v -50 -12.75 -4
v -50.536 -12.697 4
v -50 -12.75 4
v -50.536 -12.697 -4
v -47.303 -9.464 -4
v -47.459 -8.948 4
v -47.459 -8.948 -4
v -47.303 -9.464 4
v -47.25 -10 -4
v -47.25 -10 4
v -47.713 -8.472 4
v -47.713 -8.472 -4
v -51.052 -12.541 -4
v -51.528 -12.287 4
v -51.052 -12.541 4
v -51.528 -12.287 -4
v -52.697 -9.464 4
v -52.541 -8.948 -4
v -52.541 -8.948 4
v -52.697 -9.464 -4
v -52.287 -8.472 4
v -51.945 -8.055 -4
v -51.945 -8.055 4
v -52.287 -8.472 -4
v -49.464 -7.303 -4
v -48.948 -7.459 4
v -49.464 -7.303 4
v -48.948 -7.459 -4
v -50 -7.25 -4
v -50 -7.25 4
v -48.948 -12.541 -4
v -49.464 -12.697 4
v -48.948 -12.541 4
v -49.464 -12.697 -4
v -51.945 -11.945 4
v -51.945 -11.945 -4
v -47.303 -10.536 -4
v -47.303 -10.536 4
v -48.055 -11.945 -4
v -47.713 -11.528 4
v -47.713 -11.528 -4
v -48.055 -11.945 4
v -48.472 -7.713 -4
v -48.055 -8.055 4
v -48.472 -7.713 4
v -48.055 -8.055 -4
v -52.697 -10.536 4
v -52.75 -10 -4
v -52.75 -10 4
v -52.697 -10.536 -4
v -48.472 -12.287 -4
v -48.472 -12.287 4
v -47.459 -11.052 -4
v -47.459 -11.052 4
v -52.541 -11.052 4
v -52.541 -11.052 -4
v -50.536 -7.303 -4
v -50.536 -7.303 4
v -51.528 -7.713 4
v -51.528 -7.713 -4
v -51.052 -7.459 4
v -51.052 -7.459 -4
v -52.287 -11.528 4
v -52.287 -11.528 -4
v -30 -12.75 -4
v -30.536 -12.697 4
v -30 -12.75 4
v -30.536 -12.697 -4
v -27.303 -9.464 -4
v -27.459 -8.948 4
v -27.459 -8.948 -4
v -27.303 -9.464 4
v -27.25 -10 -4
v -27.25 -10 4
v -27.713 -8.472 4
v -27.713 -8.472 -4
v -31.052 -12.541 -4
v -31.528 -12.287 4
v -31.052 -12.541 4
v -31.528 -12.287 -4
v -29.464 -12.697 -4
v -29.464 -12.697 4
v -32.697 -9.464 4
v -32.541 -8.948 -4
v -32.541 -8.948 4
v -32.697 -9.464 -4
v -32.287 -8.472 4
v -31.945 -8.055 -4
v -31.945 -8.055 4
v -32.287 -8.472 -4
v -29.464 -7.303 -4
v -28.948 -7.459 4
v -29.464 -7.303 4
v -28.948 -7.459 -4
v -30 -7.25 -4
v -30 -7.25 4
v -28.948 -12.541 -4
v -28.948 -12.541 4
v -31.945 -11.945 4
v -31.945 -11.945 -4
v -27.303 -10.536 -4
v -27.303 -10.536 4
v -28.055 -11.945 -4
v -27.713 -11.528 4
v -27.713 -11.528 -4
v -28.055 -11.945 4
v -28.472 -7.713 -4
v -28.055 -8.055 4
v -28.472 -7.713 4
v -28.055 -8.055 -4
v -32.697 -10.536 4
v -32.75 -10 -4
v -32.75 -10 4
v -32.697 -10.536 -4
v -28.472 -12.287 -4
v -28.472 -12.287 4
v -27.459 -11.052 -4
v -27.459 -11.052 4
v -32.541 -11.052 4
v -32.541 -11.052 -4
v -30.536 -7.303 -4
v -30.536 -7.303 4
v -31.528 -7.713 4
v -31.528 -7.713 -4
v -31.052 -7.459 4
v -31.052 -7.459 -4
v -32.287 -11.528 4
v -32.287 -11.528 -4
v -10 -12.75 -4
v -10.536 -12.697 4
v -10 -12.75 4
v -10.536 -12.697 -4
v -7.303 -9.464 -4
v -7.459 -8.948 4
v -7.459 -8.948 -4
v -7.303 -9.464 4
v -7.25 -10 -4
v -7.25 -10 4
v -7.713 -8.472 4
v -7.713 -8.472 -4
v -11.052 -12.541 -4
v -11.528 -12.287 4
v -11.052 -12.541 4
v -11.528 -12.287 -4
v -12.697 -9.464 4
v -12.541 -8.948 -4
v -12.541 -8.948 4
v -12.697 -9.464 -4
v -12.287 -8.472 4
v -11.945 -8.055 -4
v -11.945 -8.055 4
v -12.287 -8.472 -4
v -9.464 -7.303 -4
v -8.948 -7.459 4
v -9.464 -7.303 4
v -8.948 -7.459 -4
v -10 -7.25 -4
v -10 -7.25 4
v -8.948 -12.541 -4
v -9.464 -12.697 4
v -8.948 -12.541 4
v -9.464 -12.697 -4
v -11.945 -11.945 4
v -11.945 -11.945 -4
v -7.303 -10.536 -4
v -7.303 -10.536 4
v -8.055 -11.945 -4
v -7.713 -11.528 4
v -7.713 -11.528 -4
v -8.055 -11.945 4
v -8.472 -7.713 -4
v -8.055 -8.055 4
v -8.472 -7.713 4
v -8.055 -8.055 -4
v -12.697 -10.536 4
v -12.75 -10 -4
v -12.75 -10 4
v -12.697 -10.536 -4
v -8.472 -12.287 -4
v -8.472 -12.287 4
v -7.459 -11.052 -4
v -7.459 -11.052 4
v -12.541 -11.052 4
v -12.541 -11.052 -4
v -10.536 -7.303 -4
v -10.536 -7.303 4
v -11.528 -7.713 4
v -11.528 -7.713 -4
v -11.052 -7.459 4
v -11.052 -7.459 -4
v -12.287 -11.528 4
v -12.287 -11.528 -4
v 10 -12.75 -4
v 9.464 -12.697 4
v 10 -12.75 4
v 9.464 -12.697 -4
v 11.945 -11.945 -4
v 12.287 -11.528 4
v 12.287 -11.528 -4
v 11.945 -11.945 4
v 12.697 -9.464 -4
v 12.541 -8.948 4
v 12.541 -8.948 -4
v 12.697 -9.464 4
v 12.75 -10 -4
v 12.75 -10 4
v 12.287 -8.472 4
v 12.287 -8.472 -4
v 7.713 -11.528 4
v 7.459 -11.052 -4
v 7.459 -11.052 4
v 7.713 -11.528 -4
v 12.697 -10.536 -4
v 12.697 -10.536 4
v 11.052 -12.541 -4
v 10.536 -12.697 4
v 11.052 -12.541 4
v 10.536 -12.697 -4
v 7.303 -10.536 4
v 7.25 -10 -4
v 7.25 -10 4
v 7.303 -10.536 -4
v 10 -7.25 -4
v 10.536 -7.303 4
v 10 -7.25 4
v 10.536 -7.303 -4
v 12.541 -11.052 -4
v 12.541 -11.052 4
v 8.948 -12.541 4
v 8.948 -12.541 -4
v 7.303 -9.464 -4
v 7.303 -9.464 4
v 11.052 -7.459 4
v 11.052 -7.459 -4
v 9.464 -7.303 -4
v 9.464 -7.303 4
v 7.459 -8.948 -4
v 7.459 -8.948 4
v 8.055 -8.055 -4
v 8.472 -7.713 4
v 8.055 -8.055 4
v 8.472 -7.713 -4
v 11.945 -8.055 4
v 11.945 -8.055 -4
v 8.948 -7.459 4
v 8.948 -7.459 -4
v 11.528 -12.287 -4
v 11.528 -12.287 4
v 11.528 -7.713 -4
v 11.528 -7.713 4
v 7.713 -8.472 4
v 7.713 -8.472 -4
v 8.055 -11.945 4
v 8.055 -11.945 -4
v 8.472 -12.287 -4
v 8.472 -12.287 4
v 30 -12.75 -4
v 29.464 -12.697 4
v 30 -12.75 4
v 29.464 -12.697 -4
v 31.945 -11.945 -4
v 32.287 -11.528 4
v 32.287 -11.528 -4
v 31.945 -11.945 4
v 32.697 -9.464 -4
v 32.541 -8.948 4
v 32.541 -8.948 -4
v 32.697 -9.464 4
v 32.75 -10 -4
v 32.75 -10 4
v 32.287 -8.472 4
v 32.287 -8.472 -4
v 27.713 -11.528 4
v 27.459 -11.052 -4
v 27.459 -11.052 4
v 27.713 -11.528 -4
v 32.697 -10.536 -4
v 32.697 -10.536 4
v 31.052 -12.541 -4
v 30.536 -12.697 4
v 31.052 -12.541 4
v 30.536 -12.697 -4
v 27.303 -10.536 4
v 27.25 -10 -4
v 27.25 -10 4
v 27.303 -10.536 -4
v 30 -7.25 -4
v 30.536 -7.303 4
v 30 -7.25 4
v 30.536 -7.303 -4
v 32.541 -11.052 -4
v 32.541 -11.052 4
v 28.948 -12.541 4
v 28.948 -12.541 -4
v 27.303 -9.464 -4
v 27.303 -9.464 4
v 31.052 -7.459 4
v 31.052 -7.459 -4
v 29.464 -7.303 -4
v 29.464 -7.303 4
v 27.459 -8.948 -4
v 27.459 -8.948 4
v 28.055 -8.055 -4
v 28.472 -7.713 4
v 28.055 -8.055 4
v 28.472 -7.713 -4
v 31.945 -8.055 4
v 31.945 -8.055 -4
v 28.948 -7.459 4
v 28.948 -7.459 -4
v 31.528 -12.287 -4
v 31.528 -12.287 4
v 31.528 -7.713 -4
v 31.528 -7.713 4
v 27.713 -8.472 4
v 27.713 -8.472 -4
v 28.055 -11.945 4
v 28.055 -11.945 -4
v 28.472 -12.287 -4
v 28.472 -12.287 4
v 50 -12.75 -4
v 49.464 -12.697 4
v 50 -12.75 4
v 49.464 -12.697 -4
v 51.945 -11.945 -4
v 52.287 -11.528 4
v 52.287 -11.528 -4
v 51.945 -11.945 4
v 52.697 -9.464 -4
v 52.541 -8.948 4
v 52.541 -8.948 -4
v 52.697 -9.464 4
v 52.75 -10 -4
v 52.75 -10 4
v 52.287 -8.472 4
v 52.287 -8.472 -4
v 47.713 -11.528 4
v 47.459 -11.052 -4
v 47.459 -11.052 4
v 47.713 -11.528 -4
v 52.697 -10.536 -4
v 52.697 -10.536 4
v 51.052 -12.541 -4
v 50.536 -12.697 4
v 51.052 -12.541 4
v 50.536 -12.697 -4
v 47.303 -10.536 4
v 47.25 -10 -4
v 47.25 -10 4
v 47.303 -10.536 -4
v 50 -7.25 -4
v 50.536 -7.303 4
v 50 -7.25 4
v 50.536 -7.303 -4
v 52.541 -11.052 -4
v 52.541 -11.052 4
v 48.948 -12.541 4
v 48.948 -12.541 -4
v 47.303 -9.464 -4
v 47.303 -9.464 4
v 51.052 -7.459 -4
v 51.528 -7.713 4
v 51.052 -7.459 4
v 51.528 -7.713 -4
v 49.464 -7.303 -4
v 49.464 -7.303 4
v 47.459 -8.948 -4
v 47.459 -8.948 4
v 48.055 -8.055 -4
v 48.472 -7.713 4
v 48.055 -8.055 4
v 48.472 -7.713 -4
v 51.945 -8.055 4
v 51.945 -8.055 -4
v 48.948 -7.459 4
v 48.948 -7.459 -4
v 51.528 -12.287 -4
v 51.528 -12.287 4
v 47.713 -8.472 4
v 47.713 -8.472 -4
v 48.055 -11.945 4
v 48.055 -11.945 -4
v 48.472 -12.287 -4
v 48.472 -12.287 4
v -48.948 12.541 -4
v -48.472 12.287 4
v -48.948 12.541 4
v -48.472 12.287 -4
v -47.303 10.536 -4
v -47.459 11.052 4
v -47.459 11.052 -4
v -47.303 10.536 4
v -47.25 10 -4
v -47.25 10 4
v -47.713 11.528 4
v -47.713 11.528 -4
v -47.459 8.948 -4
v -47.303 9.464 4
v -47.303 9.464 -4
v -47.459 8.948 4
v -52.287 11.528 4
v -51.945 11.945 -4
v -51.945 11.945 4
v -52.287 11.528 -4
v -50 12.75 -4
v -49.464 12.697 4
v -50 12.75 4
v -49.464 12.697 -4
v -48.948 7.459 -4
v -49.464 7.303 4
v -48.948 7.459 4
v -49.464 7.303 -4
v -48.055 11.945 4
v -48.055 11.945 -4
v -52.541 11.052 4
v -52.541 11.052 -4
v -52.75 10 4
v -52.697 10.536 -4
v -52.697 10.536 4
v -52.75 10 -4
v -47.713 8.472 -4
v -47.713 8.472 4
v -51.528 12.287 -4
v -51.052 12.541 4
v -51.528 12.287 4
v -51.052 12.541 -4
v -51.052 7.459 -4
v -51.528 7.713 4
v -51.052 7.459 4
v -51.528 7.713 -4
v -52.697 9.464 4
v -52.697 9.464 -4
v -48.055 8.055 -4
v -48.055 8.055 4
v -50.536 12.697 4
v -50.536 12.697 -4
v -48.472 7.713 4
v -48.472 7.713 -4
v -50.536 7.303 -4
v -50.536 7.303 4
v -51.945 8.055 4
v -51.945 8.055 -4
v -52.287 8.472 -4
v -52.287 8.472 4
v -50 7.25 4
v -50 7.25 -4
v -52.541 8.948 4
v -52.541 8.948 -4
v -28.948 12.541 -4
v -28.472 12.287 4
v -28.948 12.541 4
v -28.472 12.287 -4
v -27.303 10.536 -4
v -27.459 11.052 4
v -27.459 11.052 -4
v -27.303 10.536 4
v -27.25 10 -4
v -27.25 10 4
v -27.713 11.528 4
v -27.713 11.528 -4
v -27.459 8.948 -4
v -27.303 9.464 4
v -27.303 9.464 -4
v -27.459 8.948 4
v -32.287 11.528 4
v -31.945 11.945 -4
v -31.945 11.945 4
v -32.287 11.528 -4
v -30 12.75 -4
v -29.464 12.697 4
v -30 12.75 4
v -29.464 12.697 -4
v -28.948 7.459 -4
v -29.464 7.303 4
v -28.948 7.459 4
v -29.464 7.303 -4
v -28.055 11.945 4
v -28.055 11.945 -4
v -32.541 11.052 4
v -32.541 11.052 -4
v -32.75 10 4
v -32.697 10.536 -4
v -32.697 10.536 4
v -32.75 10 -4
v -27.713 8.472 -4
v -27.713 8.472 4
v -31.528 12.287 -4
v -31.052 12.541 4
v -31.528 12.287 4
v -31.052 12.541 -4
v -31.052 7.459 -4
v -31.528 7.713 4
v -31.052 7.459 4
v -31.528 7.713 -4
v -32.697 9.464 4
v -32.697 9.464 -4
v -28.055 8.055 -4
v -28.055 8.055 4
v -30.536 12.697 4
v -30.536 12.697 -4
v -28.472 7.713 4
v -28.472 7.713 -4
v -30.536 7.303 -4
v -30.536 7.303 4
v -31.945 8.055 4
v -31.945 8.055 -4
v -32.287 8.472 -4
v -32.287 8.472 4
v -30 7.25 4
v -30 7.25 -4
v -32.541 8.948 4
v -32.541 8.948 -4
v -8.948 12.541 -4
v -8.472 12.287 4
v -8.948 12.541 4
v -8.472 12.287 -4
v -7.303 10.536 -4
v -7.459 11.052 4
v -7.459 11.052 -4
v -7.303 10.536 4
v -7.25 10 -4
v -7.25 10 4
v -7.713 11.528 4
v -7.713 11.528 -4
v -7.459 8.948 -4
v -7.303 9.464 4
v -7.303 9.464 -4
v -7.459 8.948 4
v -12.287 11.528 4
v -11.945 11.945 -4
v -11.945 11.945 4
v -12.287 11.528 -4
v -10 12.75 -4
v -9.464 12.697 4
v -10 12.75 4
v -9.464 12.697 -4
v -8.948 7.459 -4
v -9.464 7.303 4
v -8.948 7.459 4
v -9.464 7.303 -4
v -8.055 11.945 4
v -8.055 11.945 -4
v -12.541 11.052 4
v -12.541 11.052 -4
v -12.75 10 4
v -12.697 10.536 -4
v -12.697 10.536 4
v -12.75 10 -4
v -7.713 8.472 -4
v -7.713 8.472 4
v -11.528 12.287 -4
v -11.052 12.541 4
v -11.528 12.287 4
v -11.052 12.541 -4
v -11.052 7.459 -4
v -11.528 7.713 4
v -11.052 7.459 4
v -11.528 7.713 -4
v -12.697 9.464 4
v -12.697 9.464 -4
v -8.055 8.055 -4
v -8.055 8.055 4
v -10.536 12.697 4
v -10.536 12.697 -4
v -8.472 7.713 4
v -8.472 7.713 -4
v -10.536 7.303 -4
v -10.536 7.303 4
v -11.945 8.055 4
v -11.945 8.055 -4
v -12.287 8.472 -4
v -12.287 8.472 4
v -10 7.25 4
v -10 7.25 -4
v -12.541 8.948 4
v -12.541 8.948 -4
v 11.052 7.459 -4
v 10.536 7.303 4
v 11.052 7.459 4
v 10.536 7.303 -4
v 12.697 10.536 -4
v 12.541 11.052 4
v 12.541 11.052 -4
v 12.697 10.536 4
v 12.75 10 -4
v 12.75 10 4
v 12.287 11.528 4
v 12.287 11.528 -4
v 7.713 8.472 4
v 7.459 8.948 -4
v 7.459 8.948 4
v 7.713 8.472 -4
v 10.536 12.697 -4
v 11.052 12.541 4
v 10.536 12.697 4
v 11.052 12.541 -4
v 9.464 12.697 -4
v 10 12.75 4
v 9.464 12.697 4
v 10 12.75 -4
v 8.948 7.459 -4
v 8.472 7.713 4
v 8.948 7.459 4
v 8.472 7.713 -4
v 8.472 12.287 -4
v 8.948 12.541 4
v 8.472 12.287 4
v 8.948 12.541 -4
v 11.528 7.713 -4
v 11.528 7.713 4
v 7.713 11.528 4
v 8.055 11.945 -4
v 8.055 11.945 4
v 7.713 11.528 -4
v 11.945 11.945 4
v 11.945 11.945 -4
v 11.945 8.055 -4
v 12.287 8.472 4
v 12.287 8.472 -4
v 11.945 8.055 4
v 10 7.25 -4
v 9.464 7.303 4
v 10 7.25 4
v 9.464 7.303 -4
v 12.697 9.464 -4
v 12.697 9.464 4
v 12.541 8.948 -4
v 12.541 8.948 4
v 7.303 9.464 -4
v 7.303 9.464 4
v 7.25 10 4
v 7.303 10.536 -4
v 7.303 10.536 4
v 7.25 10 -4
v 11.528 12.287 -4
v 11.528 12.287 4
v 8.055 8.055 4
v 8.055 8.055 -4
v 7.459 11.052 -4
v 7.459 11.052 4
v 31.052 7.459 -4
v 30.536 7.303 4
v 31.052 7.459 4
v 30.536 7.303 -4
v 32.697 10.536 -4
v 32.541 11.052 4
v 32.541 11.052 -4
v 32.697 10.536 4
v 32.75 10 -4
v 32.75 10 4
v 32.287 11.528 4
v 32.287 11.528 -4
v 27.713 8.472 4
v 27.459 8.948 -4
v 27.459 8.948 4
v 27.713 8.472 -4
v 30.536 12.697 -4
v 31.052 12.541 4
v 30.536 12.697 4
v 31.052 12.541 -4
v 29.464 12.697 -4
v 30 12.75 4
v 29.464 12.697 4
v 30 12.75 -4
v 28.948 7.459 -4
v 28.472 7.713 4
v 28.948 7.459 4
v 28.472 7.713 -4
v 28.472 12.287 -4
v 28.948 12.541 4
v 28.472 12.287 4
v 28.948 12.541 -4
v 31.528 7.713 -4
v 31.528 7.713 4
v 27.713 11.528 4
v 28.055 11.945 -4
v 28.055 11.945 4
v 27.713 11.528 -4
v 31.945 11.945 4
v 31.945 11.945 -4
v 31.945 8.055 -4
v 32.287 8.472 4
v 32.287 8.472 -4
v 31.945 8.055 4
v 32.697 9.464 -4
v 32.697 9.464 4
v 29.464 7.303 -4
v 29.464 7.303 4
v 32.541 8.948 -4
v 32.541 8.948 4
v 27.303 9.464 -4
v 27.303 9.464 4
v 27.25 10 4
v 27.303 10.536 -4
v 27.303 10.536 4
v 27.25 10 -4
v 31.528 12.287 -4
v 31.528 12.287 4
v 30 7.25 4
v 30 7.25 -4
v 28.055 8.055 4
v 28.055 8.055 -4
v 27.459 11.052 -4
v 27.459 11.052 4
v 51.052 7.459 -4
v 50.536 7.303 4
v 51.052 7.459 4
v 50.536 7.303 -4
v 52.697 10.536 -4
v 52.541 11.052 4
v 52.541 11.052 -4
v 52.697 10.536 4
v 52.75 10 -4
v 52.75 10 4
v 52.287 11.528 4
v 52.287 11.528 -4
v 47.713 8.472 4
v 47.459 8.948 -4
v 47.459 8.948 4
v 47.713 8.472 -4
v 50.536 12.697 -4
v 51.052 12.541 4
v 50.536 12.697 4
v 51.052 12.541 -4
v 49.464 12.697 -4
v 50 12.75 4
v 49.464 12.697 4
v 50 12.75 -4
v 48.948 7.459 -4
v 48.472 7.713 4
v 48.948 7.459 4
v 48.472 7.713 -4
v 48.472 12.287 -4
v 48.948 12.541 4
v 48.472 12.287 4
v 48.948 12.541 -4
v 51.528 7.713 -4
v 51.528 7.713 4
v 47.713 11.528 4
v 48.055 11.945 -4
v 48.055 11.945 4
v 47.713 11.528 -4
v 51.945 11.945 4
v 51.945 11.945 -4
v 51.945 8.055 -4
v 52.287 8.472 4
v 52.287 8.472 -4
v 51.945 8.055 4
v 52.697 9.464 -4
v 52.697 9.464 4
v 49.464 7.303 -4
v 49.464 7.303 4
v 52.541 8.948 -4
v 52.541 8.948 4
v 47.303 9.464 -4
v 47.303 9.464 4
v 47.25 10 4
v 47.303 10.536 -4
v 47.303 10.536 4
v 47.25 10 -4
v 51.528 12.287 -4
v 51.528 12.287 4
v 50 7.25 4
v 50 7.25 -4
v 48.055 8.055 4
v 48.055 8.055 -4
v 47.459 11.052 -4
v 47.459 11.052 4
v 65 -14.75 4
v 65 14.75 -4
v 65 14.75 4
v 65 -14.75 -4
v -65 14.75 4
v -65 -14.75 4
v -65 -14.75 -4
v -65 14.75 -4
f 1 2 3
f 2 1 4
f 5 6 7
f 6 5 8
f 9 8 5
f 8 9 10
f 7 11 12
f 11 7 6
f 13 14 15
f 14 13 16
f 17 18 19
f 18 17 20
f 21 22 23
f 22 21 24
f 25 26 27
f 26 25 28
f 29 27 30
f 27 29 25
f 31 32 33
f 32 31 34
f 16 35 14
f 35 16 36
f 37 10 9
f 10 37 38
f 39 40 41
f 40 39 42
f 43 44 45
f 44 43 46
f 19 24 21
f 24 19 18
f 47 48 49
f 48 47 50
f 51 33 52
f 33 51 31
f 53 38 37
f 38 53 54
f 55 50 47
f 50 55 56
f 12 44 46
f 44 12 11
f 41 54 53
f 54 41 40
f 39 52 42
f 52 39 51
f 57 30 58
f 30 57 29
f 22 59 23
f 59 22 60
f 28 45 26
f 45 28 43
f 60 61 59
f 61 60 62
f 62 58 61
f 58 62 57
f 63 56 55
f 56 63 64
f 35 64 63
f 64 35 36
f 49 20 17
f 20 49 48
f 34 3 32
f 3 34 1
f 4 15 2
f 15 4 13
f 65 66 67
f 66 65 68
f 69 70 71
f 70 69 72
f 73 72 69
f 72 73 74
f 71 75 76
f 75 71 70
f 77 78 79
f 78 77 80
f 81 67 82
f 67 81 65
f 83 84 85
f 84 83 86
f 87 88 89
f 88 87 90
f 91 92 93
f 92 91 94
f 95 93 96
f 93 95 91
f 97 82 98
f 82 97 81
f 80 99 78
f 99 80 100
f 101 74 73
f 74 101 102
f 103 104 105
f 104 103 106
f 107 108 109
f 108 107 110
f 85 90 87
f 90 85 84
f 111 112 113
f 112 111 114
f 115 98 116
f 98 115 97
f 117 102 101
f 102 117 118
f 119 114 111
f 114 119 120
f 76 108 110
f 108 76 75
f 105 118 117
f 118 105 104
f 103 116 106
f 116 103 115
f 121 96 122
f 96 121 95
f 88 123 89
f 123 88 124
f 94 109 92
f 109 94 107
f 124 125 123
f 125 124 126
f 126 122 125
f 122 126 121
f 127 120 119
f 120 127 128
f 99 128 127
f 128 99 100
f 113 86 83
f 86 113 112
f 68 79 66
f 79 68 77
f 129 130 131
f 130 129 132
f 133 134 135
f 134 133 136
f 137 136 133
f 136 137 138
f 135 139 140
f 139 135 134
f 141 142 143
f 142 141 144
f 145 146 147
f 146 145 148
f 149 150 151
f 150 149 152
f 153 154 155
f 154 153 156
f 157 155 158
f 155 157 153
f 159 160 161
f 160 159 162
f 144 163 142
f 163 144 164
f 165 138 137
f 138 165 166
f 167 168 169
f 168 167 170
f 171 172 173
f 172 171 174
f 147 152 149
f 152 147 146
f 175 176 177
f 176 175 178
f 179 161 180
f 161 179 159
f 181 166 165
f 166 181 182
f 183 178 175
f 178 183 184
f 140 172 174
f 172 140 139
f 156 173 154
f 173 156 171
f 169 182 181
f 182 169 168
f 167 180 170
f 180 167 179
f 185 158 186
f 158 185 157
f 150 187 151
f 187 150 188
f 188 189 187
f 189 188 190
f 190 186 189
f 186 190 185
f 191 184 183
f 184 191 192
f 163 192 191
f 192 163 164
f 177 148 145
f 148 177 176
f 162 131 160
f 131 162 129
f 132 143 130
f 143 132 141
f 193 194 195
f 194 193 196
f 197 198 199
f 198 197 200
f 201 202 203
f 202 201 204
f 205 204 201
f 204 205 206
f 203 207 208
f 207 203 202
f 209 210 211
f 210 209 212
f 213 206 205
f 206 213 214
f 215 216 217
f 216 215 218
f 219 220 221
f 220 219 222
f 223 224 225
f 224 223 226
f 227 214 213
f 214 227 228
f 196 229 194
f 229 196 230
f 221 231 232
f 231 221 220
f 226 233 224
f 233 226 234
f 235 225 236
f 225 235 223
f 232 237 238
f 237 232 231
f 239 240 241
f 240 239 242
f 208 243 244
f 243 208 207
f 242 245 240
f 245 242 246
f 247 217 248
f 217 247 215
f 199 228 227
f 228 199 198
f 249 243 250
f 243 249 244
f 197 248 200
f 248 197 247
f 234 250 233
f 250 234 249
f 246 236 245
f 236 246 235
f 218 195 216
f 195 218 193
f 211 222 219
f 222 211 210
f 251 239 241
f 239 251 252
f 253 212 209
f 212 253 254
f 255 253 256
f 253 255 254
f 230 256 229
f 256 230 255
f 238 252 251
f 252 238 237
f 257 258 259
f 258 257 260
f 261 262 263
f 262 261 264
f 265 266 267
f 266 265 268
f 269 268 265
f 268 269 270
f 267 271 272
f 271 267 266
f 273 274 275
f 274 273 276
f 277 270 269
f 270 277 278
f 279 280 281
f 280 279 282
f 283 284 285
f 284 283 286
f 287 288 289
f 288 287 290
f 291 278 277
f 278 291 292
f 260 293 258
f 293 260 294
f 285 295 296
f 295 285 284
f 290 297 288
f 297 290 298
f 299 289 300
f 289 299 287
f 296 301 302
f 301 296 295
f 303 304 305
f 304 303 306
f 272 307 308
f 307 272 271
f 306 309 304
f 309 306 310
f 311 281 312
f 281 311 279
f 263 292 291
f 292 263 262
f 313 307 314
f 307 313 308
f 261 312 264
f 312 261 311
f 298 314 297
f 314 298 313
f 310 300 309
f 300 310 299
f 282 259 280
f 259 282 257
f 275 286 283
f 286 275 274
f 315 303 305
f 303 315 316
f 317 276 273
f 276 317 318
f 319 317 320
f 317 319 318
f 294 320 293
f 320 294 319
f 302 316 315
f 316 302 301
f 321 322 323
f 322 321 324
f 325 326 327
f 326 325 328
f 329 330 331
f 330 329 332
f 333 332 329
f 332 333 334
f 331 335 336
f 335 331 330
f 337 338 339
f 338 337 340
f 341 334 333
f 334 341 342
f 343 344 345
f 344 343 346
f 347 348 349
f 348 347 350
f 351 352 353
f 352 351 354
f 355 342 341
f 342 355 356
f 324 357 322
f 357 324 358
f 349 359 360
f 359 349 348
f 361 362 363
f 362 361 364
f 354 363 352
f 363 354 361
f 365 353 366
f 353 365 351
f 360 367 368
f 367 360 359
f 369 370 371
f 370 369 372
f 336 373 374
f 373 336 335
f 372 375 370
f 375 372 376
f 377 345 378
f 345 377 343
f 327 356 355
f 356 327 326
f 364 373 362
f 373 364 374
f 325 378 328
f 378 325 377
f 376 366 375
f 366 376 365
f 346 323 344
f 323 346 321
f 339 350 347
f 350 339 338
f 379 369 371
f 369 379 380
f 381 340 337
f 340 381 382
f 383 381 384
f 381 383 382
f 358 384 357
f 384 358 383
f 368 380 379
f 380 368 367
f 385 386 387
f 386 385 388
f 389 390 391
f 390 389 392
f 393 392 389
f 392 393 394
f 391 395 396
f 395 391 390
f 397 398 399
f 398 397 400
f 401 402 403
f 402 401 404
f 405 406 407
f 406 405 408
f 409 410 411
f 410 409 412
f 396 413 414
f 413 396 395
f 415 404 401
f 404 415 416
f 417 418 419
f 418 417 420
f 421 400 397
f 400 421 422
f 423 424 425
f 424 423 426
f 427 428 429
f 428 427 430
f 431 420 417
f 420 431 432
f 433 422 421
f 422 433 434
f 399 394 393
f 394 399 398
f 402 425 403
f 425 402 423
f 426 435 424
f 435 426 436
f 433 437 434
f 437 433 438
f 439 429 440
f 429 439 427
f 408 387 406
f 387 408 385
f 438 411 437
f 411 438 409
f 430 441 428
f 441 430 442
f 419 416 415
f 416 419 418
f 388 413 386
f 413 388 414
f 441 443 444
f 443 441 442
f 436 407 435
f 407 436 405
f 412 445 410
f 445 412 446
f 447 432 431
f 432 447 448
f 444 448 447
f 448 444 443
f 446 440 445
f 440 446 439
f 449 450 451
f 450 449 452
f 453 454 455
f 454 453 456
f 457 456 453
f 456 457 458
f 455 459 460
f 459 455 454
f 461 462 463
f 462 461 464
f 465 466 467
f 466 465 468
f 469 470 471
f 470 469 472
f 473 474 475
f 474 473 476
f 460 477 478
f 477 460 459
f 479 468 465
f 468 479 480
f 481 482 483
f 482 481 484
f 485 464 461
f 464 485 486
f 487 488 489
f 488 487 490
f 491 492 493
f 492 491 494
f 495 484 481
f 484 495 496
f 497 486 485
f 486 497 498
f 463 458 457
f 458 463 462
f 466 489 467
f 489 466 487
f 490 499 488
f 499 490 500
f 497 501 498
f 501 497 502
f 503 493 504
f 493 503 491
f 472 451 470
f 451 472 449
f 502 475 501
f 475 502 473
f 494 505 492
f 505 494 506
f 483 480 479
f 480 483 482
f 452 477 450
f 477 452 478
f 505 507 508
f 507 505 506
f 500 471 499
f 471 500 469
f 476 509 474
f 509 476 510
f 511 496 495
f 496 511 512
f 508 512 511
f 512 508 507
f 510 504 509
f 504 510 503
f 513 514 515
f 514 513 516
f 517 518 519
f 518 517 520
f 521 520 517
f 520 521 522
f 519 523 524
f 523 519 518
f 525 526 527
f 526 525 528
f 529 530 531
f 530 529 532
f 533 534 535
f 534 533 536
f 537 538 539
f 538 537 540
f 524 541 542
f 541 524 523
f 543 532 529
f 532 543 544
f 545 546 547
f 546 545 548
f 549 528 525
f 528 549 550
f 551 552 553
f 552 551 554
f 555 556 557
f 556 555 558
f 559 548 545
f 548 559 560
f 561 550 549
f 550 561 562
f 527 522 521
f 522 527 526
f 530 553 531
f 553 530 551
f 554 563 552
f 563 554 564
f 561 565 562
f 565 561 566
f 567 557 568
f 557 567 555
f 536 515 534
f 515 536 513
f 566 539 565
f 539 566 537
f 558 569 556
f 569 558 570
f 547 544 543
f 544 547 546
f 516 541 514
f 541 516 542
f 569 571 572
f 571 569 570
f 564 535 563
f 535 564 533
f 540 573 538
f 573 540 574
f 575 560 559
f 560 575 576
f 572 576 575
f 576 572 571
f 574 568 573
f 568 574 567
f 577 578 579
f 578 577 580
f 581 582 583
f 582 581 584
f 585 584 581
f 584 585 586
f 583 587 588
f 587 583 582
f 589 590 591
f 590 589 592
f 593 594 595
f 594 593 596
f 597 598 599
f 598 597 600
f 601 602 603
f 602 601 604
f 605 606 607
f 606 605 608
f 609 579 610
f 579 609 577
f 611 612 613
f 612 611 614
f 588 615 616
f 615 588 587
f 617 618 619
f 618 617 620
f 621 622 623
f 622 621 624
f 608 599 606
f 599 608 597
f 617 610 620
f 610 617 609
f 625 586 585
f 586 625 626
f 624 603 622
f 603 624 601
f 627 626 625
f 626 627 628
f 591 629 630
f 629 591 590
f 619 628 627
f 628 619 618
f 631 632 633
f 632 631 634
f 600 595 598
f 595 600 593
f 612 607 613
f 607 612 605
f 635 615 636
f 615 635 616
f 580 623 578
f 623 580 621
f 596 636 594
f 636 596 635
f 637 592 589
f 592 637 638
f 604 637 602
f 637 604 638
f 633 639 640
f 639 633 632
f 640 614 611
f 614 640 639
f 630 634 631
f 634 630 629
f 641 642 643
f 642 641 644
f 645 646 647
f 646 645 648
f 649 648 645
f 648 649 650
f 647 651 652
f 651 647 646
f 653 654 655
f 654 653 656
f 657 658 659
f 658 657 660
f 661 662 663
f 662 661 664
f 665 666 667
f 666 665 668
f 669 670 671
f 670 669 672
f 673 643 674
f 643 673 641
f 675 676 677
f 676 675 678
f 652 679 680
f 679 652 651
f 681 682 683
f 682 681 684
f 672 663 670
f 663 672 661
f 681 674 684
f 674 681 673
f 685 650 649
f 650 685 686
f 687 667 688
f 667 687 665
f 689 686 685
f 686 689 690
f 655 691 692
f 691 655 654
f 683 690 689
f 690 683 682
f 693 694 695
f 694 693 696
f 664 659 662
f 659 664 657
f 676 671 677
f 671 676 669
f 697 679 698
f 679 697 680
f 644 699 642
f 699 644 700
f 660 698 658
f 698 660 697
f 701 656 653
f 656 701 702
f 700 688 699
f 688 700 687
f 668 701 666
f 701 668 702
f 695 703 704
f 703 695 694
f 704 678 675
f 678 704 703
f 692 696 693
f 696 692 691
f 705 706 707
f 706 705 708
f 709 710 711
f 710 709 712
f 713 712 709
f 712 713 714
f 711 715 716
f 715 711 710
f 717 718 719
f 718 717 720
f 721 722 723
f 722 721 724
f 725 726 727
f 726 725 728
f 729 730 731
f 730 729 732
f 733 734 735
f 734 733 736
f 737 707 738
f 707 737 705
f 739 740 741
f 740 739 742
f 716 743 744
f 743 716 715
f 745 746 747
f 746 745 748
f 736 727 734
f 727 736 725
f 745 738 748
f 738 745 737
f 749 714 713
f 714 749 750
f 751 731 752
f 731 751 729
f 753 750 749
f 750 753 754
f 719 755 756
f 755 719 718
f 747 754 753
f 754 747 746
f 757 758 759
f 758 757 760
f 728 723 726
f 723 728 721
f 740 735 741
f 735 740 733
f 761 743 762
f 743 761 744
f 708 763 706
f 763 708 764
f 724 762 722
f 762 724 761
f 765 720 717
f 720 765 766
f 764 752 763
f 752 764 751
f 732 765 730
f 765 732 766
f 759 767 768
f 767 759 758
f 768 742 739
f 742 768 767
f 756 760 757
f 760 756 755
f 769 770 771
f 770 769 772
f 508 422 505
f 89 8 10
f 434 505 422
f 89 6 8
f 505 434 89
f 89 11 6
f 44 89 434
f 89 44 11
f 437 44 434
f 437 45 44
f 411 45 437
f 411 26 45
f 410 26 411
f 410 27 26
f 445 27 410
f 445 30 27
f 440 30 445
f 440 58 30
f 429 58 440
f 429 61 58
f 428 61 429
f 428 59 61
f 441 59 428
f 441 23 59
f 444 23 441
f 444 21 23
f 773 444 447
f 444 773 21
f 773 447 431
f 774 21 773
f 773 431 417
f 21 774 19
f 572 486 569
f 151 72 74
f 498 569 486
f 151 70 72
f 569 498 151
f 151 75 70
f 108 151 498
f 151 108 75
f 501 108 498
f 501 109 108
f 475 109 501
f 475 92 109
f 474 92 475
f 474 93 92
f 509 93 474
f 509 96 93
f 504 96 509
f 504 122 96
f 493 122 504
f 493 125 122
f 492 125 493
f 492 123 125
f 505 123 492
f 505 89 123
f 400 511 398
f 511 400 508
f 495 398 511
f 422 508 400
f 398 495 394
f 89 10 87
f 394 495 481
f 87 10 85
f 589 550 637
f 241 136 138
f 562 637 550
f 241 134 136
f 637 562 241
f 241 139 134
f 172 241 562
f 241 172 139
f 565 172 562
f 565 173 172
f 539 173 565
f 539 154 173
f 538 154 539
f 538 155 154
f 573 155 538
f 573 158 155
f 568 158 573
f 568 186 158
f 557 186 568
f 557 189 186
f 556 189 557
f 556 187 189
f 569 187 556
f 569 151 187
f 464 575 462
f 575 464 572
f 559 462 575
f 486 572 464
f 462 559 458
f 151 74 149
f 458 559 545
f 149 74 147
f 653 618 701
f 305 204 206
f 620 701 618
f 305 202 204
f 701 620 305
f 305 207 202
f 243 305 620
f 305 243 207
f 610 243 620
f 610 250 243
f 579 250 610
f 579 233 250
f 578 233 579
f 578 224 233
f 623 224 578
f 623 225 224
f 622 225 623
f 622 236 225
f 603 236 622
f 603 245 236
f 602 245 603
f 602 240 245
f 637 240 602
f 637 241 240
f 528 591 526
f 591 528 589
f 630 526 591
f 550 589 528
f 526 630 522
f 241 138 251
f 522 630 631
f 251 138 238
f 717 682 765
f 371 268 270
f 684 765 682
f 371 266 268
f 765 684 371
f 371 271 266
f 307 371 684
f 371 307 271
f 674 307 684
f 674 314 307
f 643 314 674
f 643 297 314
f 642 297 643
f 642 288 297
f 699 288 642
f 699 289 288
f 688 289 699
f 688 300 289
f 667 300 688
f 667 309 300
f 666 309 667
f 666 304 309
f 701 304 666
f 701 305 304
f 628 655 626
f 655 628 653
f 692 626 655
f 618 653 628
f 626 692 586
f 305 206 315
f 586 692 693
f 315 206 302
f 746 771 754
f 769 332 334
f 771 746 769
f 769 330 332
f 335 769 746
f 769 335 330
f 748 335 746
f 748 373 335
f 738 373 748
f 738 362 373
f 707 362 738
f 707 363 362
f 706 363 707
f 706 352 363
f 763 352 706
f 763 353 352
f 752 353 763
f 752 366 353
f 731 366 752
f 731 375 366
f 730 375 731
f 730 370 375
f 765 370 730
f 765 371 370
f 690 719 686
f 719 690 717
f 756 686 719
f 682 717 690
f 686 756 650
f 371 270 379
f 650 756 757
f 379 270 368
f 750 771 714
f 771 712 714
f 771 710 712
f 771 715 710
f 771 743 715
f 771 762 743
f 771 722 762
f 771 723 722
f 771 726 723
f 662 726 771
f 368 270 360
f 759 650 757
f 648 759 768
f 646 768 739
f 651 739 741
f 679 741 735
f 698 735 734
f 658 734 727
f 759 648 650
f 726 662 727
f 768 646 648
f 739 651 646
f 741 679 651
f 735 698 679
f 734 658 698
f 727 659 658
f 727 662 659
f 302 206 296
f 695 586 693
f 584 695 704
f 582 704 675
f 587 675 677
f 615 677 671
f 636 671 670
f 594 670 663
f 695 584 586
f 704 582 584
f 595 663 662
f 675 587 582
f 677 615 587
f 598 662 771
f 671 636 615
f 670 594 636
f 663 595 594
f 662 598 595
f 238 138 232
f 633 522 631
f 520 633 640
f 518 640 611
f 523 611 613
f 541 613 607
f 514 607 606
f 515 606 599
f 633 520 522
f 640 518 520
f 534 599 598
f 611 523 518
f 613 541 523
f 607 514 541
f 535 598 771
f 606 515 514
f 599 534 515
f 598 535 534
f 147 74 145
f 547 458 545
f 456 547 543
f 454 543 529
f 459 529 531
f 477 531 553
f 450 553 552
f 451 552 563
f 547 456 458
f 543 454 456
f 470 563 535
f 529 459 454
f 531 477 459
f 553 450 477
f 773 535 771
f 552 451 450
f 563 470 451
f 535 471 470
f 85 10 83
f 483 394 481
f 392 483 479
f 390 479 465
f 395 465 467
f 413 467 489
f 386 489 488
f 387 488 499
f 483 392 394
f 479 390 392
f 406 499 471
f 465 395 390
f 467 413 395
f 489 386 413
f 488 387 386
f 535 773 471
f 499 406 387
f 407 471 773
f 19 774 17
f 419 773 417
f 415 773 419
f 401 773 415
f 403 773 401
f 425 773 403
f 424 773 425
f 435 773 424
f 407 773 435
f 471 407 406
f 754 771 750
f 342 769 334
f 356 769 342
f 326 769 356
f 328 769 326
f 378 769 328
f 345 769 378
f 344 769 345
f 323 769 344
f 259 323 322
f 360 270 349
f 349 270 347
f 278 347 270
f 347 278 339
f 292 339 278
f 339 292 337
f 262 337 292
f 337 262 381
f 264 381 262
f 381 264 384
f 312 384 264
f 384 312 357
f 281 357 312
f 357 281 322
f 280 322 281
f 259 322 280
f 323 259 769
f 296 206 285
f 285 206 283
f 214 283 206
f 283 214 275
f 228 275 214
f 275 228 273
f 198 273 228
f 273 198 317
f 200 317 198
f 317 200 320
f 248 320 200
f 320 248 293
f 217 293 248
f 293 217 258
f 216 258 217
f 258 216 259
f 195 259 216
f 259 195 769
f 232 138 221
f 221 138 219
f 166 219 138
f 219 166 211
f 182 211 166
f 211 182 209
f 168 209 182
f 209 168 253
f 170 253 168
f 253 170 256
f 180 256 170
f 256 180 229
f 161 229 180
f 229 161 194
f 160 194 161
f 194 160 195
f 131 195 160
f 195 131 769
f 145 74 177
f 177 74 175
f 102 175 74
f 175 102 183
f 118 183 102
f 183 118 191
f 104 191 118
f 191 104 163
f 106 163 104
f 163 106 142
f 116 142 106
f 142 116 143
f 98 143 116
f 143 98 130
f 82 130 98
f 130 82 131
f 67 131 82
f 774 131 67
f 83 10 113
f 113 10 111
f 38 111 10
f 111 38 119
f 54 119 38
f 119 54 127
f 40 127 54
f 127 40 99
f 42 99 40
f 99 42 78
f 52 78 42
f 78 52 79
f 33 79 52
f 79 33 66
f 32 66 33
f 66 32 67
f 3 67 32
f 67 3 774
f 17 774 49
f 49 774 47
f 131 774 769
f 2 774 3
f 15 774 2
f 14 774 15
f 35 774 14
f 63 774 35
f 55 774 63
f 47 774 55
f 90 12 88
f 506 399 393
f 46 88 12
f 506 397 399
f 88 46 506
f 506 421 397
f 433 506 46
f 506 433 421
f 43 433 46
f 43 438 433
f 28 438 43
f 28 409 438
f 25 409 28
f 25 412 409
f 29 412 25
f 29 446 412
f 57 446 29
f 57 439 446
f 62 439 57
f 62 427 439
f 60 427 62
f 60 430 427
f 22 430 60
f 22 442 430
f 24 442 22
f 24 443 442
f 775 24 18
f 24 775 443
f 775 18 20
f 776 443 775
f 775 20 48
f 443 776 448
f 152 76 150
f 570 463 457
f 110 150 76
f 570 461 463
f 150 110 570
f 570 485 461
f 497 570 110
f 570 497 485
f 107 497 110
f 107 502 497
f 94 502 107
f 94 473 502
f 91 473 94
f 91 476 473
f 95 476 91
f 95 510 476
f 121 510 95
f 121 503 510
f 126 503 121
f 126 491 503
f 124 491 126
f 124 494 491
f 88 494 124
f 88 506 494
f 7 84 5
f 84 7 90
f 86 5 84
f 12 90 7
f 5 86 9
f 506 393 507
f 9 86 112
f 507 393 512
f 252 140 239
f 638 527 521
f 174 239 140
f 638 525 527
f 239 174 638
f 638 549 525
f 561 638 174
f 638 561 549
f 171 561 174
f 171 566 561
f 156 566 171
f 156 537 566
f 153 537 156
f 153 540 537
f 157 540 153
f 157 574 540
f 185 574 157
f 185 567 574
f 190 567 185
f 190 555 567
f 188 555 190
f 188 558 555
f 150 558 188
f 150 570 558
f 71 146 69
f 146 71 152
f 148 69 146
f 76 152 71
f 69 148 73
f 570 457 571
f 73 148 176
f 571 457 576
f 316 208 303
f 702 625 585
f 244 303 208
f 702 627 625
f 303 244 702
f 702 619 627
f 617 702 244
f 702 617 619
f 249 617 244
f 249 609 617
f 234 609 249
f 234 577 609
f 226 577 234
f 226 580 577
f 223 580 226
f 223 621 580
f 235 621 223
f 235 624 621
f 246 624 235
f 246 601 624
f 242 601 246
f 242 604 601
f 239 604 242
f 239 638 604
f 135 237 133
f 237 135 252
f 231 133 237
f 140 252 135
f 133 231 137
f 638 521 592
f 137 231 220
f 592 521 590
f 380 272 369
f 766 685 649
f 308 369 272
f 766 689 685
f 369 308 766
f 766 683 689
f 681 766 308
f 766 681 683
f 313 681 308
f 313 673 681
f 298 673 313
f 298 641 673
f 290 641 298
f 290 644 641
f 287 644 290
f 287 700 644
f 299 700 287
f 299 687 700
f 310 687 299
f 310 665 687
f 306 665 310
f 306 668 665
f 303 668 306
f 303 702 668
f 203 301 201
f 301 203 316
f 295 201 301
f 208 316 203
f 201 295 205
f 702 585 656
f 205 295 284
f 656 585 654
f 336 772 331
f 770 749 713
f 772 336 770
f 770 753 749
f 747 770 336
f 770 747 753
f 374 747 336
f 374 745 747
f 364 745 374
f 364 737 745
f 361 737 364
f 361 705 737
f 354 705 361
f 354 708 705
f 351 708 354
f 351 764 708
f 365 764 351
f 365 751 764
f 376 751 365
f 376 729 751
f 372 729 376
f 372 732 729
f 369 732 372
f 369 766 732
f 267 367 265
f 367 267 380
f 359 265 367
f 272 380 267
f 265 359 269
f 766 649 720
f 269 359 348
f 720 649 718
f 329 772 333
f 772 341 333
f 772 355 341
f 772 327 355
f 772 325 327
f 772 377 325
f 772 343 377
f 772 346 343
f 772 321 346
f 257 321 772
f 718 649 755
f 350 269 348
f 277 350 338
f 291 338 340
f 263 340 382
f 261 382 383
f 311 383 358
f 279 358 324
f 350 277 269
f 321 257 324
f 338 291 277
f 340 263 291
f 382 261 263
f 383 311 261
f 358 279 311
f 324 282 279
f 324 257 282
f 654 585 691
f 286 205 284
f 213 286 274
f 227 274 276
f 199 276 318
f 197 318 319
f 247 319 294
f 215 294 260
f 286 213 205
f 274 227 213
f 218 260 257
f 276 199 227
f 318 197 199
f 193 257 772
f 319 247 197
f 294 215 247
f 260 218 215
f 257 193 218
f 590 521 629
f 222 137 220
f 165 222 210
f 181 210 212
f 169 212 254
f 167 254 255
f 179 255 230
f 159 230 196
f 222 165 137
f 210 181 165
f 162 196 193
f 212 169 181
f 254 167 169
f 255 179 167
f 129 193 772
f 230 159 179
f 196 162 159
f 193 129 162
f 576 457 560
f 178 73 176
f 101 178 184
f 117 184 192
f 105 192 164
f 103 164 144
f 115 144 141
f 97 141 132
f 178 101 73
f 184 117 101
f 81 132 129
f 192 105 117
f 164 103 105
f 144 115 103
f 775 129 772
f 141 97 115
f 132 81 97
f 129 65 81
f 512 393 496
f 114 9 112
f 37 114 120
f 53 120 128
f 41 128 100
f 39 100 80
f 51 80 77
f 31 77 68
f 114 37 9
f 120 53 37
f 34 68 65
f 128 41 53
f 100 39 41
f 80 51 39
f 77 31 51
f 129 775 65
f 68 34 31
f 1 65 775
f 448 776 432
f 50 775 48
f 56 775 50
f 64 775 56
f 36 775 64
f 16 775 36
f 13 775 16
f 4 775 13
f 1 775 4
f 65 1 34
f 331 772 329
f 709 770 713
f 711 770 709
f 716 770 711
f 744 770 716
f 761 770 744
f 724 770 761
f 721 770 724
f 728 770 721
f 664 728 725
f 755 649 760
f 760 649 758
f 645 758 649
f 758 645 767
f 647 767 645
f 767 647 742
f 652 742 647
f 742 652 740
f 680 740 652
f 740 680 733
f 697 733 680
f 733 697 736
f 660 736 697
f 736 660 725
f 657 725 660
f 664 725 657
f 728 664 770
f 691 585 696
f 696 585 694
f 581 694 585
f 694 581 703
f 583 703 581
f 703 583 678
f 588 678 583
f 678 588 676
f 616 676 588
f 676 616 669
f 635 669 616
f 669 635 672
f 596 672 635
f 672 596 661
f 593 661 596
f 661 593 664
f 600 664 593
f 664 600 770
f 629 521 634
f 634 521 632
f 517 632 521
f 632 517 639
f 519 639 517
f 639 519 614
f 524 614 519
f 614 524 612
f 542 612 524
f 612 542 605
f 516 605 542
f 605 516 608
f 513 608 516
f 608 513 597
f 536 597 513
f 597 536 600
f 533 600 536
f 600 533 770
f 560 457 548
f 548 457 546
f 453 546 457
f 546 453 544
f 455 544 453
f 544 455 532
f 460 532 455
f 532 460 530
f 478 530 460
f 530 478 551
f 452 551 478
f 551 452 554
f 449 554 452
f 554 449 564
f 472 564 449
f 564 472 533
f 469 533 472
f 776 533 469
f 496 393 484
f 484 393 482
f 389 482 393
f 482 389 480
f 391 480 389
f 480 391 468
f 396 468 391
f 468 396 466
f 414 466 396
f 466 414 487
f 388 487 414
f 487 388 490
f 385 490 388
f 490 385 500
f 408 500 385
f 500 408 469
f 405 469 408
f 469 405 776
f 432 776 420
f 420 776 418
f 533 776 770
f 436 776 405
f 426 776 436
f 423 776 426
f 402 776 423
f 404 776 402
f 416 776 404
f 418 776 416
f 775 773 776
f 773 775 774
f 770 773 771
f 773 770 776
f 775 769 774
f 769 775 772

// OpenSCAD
$fn = 32;

// ----------------------------------------------------------------------
// Hole bar, 6 x Ø5.5
// tworows layout, 15 mm edge offset
// ----------------------------------------------------------------------

// --- parameters (mm) ---
bar_w = 29.5;     // bar width (Y)
bar_t = 8;        // bar thickness (Z)
holes = 6;        // holes per row
hole_d = 5.5;     // hole diameter
edge = 15;        // offset from the bar end to the first hole
pitch = 20;       // pitch between neighbouring holes
row_offset = 20;  // distance between the two rows

// --- derived feature positions (mm) ---
span = (holes - 1) * pitch;   // = 100   distance between the end holes
bar_l = span + 2 * edge;      // = 130   overall bar length
start_x = -bar_l / 2 + edge;  // = -50   X of the first hole
feature_centers = [
  [start_x + 0 * pitch, -row_offset / 2],
  [start_x + 1 * pitch, -row_offset / 2],
  [start_x + 2 * pitch, -row_offset / 2],
  [start_x + 3 * pitch, -row_offset / 2],
  [start_x + 4 * pitch, -row_offset / 2],
  [start_x + 5 * pitch, -row_offset / 2]
];   // hole centres of the first row
row2_centers = [
  [start_x + 0 * pitch, row_offset / 2],
  [start_x + 1 * pitch, row_offset / 2],
  [start_x + 2 * pitch, row_offset / 2],
  [start_x + 3 * pitch, row_offset / 2],
  [start_x + 4 * pitch, row_offset / 2],
  [start_x + 5 * pitch, row_offset / 2]
];   // hole centres of the second row

// bar with two rows of holes, both read from their own centre arrays
difference() {
  translate([-bar_l / 2, -bar_w / 2, -bar_t / 2]) cube([bar_l, bar_w, bar_t]);
  for (centre = feature_centers)
    translate([centre[0], centre[1], 0])
      cylinder(d = hole_d, h = bar_t + 2, center = true);
  for (centre = row2_centers)
    translate([centre[0], centre[1], 0])
      cylinder(d = hole_d, h = bar_t + 2, center = true);
}
